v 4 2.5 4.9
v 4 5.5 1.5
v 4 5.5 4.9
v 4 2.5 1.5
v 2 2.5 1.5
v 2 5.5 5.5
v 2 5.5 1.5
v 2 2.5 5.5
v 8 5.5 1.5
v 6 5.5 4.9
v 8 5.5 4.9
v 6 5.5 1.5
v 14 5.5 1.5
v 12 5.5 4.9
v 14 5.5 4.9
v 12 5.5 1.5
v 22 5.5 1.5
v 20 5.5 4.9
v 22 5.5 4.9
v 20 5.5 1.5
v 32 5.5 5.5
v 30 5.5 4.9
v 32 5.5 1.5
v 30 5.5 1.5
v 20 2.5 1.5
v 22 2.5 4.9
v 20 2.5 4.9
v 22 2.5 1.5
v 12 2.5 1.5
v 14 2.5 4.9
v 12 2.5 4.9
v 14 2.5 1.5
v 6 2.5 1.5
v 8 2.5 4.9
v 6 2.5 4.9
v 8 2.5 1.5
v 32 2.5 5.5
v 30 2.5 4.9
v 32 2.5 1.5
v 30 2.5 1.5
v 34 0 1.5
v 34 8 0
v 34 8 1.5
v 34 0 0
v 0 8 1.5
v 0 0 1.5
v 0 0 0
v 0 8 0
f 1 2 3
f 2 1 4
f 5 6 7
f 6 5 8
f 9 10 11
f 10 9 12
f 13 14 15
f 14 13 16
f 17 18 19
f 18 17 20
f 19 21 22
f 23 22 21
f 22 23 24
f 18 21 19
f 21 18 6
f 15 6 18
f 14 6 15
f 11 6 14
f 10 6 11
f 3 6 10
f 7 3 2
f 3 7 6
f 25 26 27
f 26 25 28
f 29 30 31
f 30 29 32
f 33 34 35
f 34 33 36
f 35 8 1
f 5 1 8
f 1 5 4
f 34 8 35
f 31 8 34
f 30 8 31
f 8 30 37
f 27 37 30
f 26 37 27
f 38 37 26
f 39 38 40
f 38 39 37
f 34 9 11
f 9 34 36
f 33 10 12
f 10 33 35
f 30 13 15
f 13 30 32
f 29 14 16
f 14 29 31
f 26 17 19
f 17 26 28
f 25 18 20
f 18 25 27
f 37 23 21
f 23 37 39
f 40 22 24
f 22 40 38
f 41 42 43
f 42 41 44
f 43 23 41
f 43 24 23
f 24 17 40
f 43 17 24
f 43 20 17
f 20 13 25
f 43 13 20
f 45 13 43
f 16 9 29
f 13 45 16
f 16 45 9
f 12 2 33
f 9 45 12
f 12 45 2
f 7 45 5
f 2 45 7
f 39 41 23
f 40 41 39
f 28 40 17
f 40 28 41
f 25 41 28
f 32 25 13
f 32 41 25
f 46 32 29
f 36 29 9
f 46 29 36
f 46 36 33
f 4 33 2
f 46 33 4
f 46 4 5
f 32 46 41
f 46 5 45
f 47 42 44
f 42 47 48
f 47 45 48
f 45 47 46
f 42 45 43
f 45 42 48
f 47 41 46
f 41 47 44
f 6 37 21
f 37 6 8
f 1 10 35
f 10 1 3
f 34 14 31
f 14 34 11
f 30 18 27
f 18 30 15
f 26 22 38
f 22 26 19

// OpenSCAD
// TinyMaker Resin Lab - tilteliai (paprastas modelis).
// Sija 0,6 mm storio ant penkių stulpelių, tarpai 2, 4, 6 ir 8 mm be atramų.
// Ilgiausias tarpas be įlinkio ir be skylių = Regular ir kėlimas tinka.
// STL: openscad -o TM_tiltai.stl tm_tiltai.scad

W = 3; P = 2; Hp = 4; Tb = 0.6; B = 1.5;
spans = [2, 4, 6, 8];
function px(i) = 2 + i * P + (i > 0 ? [for (j = [0 : i - 1]) spans[j]] * [for (j = [0 : i - 1]) 1] : 0);
L = px(len(spans)) + P + 2;

cube([L, 8, B]);
for (i = [0 : len(spans)])
  translate([px(i), 2.5, B - 0.01]) cube([P, W, Hp]);
translate([px(0), 2.5, B + Hp - Tb]) cube([px(len(spans)) + P - px(0), W, Tb]);
